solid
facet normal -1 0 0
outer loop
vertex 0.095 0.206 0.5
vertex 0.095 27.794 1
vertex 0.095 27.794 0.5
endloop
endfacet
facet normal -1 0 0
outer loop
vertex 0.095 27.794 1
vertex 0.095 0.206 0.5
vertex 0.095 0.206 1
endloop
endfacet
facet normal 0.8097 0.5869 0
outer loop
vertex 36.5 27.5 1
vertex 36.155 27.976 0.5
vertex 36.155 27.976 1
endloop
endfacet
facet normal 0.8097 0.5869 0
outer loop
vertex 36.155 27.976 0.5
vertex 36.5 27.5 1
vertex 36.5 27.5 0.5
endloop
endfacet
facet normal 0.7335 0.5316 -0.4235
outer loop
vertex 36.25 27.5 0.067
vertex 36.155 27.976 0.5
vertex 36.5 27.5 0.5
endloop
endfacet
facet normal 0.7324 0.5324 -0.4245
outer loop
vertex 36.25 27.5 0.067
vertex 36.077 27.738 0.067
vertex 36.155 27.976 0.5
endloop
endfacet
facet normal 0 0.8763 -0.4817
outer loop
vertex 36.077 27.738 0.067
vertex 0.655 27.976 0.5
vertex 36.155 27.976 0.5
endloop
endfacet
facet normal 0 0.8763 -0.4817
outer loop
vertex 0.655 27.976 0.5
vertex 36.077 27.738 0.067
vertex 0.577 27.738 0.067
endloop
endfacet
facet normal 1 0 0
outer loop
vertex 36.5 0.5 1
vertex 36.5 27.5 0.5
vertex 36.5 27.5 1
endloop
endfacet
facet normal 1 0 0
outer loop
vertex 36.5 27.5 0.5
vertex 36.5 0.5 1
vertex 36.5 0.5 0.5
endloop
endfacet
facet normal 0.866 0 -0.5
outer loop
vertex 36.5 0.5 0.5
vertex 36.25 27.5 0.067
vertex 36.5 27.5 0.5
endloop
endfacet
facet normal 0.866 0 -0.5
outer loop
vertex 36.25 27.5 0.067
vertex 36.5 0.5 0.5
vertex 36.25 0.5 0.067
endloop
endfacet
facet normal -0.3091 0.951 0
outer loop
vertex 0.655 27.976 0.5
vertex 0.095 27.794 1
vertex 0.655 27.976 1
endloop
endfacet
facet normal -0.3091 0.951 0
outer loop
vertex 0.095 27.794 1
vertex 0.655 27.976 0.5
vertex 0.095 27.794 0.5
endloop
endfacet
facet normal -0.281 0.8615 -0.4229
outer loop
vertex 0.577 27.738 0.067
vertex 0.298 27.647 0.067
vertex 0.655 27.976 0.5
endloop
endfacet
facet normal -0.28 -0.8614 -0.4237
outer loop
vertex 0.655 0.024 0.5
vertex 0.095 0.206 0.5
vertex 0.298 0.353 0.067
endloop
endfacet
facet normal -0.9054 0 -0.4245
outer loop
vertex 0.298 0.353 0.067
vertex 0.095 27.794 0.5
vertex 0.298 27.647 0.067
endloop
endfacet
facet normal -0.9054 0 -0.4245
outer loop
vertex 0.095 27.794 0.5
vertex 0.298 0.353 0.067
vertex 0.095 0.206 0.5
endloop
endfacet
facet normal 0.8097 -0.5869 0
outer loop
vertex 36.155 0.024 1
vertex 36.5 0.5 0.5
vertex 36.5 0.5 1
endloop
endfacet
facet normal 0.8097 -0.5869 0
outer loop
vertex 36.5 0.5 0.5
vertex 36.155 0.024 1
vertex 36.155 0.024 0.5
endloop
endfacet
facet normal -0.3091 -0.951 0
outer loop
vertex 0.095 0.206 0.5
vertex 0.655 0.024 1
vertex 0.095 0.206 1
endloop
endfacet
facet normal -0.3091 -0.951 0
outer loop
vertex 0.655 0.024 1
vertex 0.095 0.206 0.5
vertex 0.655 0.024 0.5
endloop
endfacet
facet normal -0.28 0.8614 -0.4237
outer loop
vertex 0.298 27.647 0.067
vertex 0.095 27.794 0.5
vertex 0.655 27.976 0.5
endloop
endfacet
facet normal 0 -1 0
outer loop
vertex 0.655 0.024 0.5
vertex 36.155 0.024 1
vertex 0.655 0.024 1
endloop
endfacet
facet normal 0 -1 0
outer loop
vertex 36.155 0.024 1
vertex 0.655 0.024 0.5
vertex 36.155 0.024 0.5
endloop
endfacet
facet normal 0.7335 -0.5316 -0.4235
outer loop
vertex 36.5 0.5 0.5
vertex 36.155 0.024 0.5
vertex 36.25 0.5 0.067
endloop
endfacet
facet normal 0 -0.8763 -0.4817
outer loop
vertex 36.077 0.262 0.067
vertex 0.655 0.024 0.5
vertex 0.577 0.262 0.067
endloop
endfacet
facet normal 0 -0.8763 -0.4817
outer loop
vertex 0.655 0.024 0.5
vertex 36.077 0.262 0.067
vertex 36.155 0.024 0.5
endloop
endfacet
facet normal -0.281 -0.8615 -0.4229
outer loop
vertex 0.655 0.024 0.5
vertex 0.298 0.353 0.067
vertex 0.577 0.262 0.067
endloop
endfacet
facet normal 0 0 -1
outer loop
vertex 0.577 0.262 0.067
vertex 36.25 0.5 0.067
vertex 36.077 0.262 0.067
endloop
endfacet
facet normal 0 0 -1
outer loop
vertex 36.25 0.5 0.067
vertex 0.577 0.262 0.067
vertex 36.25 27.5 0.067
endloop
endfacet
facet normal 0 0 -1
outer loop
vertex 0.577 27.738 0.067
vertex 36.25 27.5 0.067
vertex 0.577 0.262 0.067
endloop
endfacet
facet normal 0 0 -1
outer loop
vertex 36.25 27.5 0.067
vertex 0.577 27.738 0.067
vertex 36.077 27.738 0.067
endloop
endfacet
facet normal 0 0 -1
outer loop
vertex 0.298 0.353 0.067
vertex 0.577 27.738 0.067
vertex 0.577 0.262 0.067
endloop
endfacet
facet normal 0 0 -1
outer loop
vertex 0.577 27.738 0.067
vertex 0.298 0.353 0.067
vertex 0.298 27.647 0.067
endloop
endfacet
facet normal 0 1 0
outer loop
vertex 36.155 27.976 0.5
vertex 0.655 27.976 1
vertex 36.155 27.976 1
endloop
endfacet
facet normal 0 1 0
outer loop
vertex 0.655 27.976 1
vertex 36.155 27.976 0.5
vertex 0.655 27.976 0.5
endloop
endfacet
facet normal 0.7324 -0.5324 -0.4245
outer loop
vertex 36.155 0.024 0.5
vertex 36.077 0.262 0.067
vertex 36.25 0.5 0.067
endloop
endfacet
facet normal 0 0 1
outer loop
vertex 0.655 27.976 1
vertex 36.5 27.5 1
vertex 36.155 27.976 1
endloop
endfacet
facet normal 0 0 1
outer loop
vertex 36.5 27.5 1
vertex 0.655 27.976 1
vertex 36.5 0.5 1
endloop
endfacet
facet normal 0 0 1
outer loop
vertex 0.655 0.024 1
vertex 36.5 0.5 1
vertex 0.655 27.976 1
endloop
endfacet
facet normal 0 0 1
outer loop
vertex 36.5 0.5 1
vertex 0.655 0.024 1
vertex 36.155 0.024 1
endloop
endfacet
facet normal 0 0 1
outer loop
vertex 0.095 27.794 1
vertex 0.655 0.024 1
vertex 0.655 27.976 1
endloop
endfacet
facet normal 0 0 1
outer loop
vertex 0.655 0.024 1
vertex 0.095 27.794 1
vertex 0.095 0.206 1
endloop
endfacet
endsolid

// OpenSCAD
// file: dimensions.scad
Bx=30;     //battery size
By=20;
Bz=3;

Cx=34.5;     //circuit size
Cy=26;
Cz=10;

b=1;    //border width
r=0.5;    //radius of curvature
// main file
include <dimensions.scad>

x=Cx+(2*b);    //case size
y=Cy+(2*b);
z=Cz+Bz+b;

intersection() {
    translate([r,r,r]) hull() {
        sphere(r);
        translate([x-(2*r),0,0]) sphere(r);
        translate([0,y-(2*r),0]) sphere(r);
        translate([0,0,b-r]) sphere(r);
        translate([x-(2*r),y-(2*r),0]) sphere(r);
        translate([x-(2*r),0,b-r]) sphere(r);
        translate([0,y-(2*r),b-r]) sphere(r);
        translate([x-(2*r),y-(2*r),b-r]) sphere(r);
    }
    cube([x,y,b]);
}
